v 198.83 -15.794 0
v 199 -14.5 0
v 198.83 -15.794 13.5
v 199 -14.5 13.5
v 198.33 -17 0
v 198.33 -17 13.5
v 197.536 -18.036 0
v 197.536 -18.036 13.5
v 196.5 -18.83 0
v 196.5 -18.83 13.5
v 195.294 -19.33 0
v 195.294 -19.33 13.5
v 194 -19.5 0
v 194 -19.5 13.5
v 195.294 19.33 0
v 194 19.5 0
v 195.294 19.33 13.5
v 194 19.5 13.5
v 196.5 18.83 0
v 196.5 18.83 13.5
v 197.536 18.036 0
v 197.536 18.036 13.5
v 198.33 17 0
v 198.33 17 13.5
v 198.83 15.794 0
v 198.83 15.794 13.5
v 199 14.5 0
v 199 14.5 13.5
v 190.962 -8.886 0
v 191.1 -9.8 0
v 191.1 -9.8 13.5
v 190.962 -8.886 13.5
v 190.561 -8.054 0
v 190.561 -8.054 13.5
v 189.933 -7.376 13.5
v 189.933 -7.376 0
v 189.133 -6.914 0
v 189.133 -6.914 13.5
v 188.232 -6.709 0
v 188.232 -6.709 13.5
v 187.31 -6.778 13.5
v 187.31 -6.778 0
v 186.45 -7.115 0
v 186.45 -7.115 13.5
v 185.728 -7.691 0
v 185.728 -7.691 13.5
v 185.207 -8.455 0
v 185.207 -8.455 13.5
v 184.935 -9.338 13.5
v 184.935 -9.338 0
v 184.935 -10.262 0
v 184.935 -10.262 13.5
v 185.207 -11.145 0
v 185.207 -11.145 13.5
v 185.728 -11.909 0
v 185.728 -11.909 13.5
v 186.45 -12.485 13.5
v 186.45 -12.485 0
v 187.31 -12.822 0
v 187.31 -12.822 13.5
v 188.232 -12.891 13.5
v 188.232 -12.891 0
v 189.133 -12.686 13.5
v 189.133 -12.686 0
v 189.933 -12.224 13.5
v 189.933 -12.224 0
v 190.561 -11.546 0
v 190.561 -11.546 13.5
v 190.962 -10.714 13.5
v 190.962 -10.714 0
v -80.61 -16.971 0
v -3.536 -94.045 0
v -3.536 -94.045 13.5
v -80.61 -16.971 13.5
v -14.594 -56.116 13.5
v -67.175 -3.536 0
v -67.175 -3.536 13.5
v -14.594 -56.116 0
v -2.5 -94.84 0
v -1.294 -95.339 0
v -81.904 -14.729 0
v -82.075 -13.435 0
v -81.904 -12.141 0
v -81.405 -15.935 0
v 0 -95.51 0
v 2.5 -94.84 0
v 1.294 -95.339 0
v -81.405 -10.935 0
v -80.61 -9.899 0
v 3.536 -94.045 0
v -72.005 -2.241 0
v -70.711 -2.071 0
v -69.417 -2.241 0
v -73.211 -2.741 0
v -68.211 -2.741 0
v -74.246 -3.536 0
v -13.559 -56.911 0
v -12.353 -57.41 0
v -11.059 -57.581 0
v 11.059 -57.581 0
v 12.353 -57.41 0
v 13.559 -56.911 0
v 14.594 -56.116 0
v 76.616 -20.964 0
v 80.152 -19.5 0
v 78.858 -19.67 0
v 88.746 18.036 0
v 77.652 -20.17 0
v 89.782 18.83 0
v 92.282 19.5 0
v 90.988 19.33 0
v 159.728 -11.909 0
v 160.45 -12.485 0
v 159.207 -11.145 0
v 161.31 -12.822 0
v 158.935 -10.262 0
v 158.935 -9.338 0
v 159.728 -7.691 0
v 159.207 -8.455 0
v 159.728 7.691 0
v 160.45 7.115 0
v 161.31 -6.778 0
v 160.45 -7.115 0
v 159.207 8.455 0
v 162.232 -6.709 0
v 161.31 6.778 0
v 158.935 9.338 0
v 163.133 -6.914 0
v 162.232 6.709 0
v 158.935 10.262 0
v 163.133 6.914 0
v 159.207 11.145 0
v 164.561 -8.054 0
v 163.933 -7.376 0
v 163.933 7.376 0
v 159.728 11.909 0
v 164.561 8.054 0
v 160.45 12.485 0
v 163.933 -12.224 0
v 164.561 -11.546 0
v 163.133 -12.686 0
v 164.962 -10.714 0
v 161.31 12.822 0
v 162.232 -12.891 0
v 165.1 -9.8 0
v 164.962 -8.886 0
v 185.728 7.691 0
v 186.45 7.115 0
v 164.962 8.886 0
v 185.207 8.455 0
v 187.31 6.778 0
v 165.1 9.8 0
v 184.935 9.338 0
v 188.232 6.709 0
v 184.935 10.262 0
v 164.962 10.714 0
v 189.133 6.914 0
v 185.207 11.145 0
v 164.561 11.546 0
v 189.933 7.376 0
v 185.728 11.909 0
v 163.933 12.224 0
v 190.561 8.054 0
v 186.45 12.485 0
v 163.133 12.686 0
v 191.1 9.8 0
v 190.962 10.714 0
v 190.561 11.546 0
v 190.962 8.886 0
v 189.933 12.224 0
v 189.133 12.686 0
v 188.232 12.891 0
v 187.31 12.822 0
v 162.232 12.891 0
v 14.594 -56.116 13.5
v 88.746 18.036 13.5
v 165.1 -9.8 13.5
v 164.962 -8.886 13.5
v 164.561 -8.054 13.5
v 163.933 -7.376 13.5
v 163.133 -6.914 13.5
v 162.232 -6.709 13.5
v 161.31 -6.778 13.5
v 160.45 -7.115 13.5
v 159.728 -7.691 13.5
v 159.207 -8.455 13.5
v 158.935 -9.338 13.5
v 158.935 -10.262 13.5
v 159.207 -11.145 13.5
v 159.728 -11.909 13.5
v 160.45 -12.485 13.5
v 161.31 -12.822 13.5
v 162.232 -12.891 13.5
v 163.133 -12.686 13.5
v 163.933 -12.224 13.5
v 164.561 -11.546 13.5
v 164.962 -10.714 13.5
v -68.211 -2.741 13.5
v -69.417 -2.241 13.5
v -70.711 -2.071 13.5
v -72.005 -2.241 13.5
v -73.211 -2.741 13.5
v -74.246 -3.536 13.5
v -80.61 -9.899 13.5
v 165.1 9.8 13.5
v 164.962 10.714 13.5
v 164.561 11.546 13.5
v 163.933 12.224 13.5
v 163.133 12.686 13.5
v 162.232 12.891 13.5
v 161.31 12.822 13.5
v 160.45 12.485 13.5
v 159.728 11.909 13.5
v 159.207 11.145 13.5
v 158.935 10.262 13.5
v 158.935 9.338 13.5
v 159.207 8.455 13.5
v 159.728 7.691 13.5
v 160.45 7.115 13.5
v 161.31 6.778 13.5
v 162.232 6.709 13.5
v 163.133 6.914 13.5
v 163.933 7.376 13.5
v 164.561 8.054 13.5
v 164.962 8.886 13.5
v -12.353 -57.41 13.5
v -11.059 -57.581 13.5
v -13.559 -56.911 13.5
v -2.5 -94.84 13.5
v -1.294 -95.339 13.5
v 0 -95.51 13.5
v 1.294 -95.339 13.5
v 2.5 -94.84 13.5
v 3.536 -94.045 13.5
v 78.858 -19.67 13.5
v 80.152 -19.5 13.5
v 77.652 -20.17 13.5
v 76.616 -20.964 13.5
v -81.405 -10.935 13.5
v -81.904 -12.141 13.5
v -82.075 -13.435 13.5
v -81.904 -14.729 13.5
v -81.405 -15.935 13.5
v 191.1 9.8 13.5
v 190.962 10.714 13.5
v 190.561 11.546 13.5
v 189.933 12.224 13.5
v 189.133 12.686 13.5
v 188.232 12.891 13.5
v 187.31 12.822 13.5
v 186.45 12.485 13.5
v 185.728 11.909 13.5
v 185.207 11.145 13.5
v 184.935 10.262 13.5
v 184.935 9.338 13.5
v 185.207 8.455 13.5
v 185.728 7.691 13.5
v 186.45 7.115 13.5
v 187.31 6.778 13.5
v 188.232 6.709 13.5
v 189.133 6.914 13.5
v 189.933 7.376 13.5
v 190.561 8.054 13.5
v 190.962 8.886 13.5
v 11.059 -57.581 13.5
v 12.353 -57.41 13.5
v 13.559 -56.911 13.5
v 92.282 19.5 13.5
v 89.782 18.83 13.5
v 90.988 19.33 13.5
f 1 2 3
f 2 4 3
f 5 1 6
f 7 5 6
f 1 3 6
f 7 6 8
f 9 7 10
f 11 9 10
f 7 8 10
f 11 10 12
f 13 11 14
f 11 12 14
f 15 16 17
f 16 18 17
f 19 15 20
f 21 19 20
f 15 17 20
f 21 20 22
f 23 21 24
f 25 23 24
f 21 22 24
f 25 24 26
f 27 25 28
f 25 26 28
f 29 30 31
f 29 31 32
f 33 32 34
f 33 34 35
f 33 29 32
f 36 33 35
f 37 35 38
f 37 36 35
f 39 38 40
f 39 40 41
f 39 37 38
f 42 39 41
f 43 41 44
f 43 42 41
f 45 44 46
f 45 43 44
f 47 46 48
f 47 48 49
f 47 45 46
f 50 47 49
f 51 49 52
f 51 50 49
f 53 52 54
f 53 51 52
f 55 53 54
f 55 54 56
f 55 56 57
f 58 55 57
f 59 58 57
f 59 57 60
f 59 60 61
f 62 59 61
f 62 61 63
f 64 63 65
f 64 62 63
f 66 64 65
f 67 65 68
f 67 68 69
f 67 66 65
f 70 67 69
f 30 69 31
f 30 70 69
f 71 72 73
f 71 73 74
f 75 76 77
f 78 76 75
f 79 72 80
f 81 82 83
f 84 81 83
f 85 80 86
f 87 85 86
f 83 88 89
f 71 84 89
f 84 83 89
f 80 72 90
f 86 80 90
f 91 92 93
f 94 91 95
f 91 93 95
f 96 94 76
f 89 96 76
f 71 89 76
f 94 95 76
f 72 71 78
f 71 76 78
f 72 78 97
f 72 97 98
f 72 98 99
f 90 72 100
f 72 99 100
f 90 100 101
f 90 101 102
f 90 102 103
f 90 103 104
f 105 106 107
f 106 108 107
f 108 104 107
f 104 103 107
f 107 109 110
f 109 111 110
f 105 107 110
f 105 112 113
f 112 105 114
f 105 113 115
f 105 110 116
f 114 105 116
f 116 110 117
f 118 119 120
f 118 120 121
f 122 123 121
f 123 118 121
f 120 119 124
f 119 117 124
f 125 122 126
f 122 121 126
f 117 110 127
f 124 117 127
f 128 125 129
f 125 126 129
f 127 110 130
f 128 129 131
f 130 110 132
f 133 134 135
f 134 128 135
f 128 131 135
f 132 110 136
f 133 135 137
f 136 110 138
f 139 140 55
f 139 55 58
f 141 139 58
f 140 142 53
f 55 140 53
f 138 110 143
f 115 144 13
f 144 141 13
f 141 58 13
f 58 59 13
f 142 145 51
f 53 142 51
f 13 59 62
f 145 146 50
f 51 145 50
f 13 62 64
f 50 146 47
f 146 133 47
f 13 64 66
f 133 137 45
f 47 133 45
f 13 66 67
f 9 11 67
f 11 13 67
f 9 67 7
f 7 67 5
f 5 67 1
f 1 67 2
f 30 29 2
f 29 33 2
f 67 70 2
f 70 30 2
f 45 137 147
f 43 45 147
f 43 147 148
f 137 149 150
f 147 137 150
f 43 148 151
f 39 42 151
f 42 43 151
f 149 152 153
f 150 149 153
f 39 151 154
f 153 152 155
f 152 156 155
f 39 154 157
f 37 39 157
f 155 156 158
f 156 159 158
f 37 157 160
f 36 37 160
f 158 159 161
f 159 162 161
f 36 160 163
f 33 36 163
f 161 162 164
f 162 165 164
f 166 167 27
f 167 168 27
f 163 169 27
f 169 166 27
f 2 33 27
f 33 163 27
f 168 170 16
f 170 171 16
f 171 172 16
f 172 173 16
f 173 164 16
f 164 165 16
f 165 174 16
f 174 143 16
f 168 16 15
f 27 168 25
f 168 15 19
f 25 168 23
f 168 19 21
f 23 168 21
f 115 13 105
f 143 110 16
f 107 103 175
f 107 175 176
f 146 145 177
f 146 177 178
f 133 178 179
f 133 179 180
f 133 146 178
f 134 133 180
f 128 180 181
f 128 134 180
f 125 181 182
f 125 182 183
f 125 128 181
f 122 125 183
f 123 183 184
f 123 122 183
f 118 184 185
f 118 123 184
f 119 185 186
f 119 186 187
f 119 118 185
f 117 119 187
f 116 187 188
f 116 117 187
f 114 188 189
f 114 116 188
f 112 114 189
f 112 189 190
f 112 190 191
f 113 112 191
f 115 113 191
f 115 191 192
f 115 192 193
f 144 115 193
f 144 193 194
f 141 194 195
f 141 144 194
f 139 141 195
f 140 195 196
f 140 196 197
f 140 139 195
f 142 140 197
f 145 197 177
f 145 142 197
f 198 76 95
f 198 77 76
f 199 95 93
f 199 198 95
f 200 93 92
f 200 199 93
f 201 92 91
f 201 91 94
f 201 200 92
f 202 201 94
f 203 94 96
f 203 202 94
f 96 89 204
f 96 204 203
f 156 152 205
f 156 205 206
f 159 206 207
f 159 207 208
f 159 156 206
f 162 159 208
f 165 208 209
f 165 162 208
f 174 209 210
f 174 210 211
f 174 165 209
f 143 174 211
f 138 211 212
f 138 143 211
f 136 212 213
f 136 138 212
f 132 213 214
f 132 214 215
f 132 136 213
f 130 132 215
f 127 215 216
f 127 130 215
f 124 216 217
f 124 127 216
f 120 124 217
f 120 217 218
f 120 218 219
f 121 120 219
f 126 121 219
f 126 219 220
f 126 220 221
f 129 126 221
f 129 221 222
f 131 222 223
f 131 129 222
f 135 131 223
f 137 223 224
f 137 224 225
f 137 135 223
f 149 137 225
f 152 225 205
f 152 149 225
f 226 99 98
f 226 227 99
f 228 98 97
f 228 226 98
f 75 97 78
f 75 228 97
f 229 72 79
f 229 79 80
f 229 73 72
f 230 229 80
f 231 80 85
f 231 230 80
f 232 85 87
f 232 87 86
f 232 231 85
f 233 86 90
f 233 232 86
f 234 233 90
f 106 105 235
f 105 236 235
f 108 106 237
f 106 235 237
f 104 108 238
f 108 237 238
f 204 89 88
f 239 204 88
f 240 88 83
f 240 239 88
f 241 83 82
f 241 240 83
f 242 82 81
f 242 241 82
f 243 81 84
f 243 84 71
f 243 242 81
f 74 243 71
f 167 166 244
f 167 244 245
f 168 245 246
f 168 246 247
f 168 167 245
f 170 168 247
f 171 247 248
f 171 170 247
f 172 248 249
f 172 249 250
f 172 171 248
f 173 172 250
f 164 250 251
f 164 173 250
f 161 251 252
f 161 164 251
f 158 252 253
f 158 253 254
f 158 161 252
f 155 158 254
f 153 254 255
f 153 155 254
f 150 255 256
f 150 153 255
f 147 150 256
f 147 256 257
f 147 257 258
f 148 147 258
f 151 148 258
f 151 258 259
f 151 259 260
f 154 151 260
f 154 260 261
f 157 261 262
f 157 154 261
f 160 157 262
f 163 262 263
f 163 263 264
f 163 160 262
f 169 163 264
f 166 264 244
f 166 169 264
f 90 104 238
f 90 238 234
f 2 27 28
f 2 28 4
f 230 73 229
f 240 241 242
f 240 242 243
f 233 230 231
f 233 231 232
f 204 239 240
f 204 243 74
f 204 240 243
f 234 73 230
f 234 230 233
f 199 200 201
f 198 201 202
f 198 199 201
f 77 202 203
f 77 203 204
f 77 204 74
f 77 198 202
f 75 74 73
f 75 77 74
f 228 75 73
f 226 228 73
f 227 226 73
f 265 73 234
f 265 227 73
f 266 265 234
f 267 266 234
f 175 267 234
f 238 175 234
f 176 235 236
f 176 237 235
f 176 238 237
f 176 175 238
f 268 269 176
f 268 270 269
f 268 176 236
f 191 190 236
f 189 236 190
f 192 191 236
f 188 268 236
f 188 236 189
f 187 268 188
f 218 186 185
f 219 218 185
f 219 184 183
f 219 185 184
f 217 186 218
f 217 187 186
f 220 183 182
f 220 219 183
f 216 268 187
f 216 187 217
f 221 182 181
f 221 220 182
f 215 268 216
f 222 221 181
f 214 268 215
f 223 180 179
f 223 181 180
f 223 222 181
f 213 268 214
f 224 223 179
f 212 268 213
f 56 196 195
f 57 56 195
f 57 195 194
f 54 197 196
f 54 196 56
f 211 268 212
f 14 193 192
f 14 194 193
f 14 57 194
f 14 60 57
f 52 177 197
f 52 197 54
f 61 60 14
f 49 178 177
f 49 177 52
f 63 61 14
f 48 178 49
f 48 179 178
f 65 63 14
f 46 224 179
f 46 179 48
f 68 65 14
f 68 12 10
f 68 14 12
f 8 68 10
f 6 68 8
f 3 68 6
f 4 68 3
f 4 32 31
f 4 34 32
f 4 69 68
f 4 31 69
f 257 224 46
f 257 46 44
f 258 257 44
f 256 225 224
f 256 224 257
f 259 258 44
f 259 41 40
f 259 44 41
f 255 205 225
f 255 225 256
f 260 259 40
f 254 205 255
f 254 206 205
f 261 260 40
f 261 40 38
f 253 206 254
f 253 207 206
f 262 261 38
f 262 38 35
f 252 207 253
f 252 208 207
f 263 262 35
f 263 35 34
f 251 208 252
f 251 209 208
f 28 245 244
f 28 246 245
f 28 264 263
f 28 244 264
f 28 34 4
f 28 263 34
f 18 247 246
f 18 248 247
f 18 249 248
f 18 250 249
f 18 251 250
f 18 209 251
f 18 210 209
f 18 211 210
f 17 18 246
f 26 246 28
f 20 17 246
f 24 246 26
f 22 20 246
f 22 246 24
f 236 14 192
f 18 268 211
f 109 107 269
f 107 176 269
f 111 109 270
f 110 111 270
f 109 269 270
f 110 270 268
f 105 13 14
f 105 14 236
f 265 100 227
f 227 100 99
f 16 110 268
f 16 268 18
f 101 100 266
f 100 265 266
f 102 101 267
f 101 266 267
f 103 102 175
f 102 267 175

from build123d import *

# Parameters (mm, degrees)
SKETCH1_R           = 3.1
BOSS_EXTRUDE1_DEPTH = 13.5
FILLET1_R           = 5


with BuildPart() as part:
    # Sketch1 → Boss-Extrude1 (new body)
    with BuildSketch(Plane.XY):
        Polygon((13.129942315, -57.580735804), (-13.129942315, -57.580735804), (0, -70.710678119), align=None)
        Polygon((0, -70.710678119), (90.210678119, 19.5), (199, 19.5), (199, -19.5), (78.080735804, -19.5), (0, -97.580735804), (-84.145706961, -13.435028843), (-70.710678119, 0), align=None)
        with Locations((188, -9.8)):
            Circle(SKETCH1_R, mode=Mode.SUBTRACT)
        with Locations((162, -9.8)):
            Circle(SKETCH1_R, mode=Mode.SUBTRACT)
        with Locations((162, 9.8)):
            Circle(SKETCH1_R, mode=Mode.SUBTRACT)
        with Locations((188, 9.8)):
            Circle(SKETCH1_R, mode=Mode.SUBTRACT)
    extrude(amount=BOSS_EXTRUDE1_DEPTH)

    # Fillet1
    fillet1_edges = [part.edges().sort_by_distance(p)[0] for p in [
        (13.129942315, -57.580735804, 6.75),
        (90.210678119, 19.5, 6.75),
        (199, 19.5, 6.75),
        (199, -19.5, 6.75),
        (78.080735804, -19.5, 6.75),
        (0, -97.580735804, 6.75),
        (-84.145706961, -13.435028843, 6.75),
        (-70.710678119, 0, 6.75),
        (-13.129942315, -57.580735804, 6.75),
    ]]
    fillet(fillet1_edges, radius=FILLET1_R)


solid = part.part
